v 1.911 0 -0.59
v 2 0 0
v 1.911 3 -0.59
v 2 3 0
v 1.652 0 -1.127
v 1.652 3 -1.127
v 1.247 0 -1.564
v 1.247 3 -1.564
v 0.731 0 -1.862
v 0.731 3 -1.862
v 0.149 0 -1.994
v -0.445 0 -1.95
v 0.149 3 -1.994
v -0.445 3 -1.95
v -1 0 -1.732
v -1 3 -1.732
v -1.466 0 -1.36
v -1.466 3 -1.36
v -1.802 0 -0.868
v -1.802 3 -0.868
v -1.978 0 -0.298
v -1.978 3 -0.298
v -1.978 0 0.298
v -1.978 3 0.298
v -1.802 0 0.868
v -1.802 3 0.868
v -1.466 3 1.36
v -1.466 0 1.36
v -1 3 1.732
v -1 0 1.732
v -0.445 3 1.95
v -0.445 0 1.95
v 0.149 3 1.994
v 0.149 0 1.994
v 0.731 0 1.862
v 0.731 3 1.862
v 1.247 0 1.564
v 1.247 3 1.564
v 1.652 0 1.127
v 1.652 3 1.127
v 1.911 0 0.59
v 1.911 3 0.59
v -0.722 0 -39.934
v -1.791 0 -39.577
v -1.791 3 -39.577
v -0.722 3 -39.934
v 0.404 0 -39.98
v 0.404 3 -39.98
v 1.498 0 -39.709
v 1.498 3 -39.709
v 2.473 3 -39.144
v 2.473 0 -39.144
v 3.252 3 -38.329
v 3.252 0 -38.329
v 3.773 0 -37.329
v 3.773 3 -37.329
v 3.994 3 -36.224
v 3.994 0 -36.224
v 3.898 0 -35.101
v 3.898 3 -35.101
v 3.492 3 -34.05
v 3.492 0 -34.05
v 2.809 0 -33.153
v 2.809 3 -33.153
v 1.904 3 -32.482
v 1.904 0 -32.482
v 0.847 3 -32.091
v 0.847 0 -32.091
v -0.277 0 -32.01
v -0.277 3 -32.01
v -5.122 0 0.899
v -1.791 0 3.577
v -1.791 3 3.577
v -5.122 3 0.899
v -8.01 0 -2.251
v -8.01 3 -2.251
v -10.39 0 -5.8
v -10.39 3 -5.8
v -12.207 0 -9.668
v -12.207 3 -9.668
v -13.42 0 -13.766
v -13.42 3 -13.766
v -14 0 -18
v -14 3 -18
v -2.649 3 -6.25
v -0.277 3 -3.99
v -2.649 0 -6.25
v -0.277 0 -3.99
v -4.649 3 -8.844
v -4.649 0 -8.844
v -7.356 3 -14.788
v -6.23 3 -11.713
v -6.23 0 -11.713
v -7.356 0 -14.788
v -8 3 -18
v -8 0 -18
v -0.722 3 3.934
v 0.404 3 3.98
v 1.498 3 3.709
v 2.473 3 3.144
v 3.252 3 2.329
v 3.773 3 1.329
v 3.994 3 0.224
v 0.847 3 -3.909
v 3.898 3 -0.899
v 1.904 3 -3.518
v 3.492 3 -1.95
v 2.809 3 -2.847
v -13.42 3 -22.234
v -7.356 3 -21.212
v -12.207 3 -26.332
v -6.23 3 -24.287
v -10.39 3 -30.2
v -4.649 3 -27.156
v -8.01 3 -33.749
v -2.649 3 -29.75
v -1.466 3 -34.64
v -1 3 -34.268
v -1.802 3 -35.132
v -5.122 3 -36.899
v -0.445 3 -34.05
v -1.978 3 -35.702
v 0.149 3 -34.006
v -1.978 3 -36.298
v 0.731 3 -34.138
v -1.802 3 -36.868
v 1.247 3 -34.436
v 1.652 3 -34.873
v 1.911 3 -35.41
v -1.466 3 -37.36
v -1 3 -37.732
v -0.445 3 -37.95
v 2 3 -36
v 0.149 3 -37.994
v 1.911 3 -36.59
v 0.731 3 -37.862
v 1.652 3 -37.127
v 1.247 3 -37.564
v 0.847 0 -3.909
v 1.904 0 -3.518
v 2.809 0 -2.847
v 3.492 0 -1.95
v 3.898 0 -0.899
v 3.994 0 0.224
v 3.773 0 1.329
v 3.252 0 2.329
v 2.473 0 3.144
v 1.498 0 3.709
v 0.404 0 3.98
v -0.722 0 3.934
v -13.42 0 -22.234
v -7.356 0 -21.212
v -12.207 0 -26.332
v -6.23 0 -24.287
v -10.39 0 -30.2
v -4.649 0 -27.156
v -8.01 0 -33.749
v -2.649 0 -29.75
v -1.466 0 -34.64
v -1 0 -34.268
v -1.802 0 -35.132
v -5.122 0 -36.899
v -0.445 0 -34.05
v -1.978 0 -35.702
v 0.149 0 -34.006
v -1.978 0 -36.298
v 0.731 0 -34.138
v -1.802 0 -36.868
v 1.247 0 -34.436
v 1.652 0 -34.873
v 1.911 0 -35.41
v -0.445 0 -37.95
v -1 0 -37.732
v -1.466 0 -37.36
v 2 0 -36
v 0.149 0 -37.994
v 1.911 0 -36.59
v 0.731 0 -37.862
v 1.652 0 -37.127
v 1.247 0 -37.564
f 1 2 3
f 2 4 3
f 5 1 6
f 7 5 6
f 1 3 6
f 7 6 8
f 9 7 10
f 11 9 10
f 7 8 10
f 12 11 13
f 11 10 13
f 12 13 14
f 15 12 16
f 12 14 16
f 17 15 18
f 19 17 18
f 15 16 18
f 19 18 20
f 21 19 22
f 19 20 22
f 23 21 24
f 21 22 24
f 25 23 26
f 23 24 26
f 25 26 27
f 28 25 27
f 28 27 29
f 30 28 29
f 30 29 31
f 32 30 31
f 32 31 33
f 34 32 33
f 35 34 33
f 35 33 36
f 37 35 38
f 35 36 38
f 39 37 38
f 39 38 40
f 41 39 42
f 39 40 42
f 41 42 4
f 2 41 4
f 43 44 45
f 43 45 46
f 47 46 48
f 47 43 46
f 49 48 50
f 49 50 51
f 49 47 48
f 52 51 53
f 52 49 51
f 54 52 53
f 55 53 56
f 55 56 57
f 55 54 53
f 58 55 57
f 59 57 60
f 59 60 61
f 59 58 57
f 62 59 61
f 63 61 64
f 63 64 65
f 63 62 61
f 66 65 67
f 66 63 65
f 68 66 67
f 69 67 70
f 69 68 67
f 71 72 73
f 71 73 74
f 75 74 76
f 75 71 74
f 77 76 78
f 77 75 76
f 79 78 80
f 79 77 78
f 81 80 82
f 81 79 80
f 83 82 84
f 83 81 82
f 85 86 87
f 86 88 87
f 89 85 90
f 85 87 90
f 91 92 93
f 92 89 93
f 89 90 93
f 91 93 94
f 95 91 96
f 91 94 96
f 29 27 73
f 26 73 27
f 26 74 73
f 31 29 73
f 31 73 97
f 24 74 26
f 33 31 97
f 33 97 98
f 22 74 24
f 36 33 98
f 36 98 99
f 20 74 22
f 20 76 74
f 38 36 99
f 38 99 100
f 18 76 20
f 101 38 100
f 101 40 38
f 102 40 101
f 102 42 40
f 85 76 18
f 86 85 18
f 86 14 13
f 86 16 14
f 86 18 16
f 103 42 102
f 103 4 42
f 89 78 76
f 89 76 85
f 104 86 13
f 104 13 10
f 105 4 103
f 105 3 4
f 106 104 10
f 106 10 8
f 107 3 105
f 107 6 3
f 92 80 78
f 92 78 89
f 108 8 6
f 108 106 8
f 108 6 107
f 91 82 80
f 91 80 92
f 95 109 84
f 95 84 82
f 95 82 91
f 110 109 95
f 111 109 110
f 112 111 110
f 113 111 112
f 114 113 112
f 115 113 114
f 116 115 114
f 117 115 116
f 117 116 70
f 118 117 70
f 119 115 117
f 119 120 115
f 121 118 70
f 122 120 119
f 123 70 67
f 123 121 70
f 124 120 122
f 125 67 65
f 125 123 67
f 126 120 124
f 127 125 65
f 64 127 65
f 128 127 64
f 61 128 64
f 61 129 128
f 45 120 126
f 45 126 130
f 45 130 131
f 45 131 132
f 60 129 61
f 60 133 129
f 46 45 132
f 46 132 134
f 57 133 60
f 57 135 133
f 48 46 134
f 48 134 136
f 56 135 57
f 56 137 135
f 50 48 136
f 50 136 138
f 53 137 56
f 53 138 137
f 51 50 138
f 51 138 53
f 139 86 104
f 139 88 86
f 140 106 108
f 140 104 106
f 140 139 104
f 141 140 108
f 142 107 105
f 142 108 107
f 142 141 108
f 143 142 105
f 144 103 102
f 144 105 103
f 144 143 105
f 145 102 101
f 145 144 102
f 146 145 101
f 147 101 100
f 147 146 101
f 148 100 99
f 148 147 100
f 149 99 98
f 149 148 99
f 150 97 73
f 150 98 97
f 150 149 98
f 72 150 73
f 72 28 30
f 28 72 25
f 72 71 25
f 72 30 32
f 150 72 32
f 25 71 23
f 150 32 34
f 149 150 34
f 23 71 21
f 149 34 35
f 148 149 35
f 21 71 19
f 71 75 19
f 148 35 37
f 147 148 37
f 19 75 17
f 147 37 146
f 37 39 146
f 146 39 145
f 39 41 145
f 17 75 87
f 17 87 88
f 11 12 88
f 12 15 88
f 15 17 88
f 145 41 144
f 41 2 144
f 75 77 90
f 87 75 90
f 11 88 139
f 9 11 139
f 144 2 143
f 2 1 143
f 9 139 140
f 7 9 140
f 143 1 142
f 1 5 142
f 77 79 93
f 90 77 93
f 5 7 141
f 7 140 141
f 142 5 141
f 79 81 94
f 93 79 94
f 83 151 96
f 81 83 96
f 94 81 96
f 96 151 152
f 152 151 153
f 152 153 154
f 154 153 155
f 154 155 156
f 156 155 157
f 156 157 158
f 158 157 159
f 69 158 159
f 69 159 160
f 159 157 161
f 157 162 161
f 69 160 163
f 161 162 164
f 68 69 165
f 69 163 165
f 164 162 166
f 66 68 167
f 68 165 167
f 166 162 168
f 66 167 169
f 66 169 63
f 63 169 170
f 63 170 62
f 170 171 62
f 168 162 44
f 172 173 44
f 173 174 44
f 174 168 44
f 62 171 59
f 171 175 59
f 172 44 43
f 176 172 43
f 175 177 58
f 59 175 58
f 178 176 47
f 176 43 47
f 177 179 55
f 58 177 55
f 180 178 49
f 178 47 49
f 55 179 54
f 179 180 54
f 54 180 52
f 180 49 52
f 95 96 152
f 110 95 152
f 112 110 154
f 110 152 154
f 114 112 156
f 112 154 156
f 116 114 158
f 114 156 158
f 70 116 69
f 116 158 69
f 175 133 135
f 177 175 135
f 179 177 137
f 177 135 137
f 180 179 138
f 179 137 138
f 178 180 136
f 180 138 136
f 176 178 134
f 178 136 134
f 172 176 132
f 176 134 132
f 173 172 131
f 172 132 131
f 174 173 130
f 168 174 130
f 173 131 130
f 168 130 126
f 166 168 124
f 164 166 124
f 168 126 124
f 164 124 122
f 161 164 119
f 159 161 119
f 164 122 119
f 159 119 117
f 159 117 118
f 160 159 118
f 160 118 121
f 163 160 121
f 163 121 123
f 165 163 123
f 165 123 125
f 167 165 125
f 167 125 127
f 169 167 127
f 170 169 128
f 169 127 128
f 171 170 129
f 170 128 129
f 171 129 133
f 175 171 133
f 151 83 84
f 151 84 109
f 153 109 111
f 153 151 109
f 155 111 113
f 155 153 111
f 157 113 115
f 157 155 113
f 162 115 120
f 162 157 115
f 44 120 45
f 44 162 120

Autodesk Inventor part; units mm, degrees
ref_plane "YZ Plane" through (0, 0, 0) normal (1, 0, 0) x (0, 1, 0)
ref_plane "XZ Plane" through (0, 0, 0) normal (0, 1, 0) x (-1, 0, 0)
ref_plane "XY Plane" through (0, 0, 0) normal (0, 0, 1) x (1, 0, 0)
sketch "Эскиз3" plane through (0, 0, 0) normal (0, 1, 0) x (-1, 0, 0)
  arc A0 (1.791, 3.5766) -> (0.2774, -3.9904) centre (0, 0) ccw
  arc A1 (14, -18) -> (1.791, 3.5766) centre (-14.1884, -19.7077) ccw
  arc A2 (8, -18) -> (0.2774, -3.9904) centre (-13.2839, -20.5991) ccw
  line L0 (8, -18) -> (14, -18)
  line L1 (0, 0) -> (13.752, 0)
  dimension "d12" = 8
  dimension "d27" = 8
  dimension "d29" = 18
  dimension "d30" = 6
extrude "Выдавливание5" add sketch "Эскиз3" along normal blind 3
sketch "Эскиз5" plane through (0, 3, 0) normal (0, 1, 0) x (1, 0, 0)
  circle A0 centre (0, 0) radius 2
  dimension "d24" = 4
extrude "Выдавливание6" cut sketch "Эскиз5" against normal blind 10
mirror "Зеркальное отражение1" about plane through (-8, 0, -18) normal (0, 0, -1) of "Выдавливание5", "Выдавливание6"
properties part number "000.703 - Тяга" material "Пластик АБС"
